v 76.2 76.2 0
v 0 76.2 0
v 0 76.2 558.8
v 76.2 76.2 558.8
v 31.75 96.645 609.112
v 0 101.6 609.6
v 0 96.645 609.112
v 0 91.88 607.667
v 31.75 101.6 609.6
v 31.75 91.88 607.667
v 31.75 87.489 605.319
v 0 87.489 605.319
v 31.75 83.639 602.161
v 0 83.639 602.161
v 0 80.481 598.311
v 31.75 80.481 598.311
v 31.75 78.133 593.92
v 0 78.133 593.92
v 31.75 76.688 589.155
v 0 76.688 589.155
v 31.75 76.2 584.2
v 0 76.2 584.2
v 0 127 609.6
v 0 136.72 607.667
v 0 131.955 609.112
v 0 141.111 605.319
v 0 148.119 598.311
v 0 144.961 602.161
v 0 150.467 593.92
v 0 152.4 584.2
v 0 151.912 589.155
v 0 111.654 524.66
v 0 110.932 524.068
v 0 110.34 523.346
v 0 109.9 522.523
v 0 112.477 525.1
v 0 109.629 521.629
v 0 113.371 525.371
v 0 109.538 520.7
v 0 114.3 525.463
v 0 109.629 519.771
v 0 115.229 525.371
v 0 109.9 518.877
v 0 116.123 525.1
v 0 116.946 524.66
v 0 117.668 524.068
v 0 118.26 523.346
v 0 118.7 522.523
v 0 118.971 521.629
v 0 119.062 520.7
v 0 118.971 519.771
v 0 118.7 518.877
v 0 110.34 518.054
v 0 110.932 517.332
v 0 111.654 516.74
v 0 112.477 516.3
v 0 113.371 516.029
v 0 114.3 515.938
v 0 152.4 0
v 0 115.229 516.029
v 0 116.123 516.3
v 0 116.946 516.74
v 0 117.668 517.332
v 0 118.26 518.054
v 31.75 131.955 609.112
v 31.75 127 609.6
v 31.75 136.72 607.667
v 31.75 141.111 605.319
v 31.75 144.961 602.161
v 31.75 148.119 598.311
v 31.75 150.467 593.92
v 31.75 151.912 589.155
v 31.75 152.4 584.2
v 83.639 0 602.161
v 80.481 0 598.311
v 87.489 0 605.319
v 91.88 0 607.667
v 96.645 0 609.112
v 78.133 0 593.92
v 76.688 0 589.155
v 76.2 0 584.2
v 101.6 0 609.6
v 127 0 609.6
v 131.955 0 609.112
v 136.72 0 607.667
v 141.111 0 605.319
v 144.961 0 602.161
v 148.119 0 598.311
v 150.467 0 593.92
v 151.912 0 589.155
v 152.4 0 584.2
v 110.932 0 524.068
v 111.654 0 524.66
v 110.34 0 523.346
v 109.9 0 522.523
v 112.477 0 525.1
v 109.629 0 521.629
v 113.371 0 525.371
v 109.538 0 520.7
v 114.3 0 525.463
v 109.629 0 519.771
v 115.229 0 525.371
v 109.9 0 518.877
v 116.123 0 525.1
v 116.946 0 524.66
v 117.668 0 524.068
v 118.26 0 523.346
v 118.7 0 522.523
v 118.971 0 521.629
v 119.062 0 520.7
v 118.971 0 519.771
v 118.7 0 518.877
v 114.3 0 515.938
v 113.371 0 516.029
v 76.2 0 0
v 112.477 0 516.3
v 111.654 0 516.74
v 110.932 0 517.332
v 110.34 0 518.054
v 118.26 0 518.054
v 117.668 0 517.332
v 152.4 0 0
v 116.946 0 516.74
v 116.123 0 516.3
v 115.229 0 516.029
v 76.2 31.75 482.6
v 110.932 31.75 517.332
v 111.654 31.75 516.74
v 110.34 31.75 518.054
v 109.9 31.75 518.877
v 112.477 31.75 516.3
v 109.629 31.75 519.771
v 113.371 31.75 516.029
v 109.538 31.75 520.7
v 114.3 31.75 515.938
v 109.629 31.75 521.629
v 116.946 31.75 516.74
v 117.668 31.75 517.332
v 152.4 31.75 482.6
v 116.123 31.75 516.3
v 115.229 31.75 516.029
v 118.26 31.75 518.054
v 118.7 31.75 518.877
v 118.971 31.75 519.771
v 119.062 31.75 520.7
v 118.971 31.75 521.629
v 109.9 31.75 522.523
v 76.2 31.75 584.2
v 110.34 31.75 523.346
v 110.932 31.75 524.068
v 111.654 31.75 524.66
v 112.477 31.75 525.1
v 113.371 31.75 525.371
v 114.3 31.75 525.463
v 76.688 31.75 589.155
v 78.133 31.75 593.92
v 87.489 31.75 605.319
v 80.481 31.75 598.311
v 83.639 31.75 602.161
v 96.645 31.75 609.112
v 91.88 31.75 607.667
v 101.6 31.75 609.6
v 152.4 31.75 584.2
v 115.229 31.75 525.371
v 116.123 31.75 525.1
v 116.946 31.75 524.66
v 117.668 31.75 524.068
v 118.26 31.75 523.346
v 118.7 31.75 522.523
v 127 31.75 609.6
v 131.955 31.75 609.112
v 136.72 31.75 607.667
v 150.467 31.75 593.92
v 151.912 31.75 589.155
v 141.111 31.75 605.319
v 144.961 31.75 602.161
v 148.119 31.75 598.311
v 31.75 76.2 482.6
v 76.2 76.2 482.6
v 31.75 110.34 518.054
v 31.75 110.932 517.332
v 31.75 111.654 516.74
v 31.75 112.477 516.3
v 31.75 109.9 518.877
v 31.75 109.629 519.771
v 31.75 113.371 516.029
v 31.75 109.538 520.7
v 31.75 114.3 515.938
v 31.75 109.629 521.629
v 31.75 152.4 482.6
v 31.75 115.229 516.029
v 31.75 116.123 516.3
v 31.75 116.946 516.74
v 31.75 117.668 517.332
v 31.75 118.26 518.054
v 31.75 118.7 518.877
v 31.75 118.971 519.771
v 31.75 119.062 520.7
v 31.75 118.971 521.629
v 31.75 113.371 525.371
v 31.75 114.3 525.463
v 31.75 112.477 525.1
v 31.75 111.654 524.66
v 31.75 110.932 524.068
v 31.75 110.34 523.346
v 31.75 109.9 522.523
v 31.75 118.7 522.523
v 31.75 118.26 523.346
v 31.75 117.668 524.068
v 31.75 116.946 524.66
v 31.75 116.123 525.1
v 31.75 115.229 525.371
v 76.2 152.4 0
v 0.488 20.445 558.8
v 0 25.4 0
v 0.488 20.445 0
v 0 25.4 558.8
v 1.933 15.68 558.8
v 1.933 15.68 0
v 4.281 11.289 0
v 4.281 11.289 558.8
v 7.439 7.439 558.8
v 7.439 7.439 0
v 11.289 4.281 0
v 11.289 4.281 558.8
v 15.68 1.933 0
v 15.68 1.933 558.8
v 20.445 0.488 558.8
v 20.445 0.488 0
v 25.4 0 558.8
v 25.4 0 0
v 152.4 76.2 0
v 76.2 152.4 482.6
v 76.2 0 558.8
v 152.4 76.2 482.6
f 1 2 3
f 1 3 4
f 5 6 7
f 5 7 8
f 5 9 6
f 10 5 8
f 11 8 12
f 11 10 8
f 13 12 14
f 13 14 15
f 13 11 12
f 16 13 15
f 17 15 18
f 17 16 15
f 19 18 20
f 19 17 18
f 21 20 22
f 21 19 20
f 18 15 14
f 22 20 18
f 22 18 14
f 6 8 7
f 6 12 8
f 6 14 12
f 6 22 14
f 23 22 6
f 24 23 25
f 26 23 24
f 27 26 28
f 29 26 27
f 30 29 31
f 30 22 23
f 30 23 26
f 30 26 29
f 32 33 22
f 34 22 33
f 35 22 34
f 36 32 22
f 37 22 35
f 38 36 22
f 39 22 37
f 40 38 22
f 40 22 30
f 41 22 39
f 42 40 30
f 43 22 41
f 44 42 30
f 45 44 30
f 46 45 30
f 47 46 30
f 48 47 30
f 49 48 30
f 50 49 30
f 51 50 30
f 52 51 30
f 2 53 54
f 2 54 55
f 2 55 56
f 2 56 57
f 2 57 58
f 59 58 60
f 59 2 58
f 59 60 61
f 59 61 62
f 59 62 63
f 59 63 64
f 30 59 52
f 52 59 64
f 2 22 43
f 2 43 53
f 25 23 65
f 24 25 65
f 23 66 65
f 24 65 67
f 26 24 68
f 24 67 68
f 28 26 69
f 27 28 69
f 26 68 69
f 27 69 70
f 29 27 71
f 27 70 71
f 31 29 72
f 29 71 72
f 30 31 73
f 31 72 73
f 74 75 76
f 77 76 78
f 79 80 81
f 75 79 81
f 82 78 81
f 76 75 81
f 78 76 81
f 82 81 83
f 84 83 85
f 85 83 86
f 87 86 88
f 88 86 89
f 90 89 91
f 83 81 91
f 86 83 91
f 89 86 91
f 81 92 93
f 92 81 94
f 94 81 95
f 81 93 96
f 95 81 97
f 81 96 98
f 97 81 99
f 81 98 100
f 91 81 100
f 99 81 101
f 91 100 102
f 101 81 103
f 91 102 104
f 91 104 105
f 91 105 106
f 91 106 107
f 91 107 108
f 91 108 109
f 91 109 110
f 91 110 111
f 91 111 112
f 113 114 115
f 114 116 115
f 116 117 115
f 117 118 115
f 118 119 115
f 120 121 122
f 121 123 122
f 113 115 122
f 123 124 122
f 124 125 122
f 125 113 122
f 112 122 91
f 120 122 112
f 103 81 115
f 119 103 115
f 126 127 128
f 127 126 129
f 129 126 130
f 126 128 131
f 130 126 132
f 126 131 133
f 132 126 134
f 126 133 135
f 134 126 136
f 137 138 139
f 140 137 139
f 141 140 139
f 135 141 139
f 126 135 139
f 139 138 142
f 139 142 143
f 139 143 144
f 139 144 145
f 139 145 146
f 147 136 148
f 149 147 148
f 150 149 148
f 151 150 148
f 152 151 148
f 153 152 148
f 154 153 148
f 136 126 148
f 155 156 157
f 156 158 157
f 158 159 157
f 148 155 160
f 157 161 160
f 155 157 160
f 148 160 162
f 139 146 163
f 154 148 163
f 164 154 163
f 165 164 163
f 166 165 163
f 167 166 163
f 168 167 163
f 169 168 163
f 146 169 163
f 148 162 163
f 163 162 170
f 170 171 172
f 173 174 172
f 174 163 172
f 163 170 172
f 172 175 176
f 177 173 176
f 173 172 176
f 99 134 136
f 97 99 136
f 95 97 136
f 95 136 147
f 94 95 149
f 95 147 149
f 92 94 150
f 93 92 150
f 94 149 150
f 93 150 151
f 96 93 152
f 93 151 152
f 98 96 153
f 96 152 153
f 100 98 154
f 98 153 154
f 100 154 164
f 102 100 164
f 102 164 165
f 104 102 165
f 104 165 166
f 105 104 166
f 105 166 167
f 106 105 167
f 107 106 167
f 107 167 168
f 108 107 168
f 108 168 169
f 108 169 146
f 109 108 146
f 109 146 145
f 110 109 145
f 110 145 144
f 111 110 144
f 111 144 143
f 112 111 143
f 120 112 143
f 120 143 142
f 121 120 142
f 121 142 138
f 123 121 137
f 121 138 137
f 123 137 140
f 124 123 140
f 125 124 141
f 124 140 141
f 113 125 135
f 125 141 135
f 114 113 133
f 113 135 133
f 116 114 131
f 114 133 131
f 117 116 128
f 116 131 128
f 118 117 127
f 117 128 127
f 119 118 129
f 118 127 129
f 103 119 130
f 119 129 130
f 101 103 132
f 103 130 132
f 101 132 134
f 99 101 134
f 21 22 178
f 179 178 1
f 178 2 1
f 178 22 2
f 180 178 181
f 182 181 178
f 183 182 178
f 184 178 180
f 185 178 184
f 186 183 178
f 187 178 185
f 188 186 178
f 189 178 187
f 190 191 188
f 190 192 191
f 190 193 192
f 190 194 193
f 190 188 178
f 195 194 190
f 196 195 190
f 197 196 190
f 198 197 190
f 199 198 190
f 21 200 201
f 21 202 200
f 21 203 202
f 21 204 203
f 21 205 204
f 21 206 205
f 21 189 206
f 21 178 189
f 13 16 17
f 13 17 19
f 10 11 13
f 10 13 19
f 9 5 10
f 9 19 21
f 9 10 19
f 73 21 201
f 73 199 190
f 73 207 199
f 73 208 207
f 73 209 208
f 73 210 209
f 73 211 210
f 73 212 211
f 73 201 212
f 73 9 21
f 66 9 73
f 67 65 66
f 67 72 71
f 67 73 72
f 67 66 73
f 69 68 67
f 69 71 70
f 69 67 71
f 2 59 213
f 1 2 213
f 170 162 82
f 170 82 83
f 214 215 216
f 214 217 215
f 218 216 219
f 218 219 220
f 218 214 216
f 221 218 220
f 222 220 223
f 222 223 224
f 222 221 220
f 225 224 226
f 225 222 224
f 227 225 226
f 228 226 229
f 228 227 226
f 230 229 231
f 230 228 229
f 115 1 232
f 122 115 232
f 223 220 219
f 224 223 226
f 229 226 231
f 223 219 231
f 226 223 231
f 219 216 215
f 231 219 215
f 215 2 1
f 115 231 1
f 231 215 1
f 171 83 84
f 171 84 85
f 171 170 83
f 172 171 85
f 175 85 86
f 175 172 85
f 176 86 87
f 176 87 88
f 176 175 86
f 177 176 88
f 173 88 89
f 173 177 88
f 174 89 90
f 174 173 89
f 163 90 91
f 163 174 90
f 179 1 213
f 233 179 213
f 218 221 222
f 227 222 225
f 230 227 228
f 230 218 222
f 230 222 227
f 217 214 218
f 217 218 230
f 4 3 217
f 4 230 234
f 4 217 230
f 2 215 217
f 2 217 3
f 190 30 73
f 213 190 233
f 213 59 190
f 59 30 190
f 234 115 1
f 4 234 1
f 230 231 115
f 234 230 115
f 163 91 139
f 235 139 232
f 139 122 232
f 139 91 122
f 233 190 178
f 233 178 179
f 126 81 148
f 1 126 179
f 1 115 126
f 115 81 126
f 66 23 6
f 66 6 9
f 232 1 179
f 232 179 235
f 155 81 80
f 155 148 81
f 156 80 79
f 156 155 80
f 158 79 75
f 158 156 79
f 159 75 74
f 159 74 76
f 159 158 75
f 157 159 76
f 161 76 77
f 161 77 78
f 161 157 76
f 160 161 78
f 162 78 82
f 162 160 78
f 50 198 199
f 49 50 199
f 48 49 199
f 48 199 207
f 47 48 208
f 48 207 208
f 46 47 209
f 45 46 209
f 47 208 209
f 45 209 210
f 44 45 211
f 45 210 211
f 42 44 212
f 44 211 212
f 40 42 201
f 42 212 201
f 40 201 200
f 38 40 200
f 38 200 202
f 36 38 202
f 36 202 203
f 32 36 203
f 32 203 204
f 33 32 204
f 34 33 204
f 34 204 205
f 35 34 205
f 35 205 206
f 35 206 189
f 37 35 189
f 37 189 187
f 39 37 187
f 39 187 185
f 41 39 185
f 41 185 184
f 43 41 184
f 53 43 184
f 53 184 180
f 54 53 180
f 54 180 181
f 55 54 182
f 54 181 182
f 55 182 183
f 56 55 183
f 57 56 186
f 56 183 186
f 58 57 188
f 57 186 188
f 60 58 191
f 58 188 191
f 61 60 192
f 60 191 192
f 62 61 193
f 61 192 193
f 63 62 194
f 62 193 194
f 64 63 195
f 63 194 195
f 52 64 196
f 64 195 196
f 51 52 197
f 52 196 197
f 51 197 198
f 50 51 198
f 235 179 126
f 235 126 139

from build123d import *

# Parameters (mm, degrees)
F0_W      = 76.2
F0_H      = 76.2
F1_DEPTH  = 558.8
F4_DEPTH  = 50.8
F5_DEPTH  = 50.8
F6_W      = 44.45
F6_H      = 76.2
F7_DEPTH  = 127
F8_W      = 76.2
F8_H      = 44.45
F9_DEPTH  = 127
F10_R     = 25.4
F10_2_R   = 25.4
F10_3_R   = 25.4
F11_R     = 4.7625
F12_DEPTH = 31.751
F13_R     = 4.7625
F14_DEPTH = 31.751


with BuildPart() as f1:
    # F0 (on Top) → F1 (new body)
    with BuildSketch(Plane.XY):
        with Locations((38.1, 38.1)):
            Rectangle(F0_W, F0_H)
    extrude(amount=F1_DEPTH)


with BuildPart() as f2_1:
    # F2: copy of F1
    add(f1.part.moved(Location((76.2, 0, 0))))

    # F5 (add): a face of the model
    f5_faces = [f2_1.faces().sort_by_distance(p)[0] for p in [
        (114.3, 38.1, 558.8),
    ]]
    extrude(f5_faces, amount=F5_DEPTH)

    # F8 (on face) → F9 (cut)
    with BuildSketch(Plane.XY.offset(609.6)):
        with Locations((114.3, 53.975)):
            Rectangle(F8_W, F8_H)
    extrude(amount=-F9_DEPTH, mode=Mode.SUBTRACT)

    # F10#2
    f10_2_edges = [f2_1.edges().sort_by_distance(p)[0] for p in [
        (76.2, 15.875, 609.6),
        (152.4, 15.875, 609.6),
    ]]
    fillet(f10_2_edges, radius=F10_2_R)

    # F13 (on face) → F14 (cut, through all)
    with BuildSketch(Plane(origin=(0, 31.75, 0), x_dir=(-1, 0, 0), z_dir=(0, 1, 0))):
        with Locations((-114.3, 520.7)):
            Circle(F13_R)
    extrude(amount=-F14_DEPTH, mode=Mode.SUBTRACT)


with BuildPart() as f3_1:
    # F3: copy of F1
    add(f1.part.moved(Location((0, 76.2, 0))))

    # F4 (add): a face of the model
    f4_faces = [f3_1.faces().sort_by_distance(p)[0] for p in [
        (38.1, 114.3, 558.8),
    ]]
    extrude(f4_faces, amount=F4_DEPTH)

    # F6 (on face) → F7 (cut)
    with BuildSketch(Plane.XY.offset(609.6)):
        with Locations((53.975, 114.3)):
            Rectangle(F6_W, F6_H)
    extrude(amount=-F7_DEPTH, mode=Mode.SUBTRACT)

    # F10#3
    f10_3_edges = [f3_1.edges().sort_by_distance(p)[0] for p in [
        (15.875, 76.2, 609.6),
        (15.875, 152.4, 609.6),
    ]]
    fillet(f10_3_edges, radius=F10_3_R)

    # F11 (on face) → F12 (cut, through all)
    with BuildSketch(Plane.YZ.offset(31.75)):
        with Locations((114.3, 520.7)):
            Circle(F11_R)
    extrude(amount=-F12_DEPTH, mode=Mode.SUBTRACT)


with BuildPart() as f1_1:
    add(f1.part)

    # F10
    f10_edges = [f1_1.edges().sort_by_distance(p)[0] for p in [
        (0, 0, 279.4),
    ]]
    fillet(f10_edges, radius=F10_R)


solid = Compound([f2_1.part, f3_1.part, f1_1.part])
